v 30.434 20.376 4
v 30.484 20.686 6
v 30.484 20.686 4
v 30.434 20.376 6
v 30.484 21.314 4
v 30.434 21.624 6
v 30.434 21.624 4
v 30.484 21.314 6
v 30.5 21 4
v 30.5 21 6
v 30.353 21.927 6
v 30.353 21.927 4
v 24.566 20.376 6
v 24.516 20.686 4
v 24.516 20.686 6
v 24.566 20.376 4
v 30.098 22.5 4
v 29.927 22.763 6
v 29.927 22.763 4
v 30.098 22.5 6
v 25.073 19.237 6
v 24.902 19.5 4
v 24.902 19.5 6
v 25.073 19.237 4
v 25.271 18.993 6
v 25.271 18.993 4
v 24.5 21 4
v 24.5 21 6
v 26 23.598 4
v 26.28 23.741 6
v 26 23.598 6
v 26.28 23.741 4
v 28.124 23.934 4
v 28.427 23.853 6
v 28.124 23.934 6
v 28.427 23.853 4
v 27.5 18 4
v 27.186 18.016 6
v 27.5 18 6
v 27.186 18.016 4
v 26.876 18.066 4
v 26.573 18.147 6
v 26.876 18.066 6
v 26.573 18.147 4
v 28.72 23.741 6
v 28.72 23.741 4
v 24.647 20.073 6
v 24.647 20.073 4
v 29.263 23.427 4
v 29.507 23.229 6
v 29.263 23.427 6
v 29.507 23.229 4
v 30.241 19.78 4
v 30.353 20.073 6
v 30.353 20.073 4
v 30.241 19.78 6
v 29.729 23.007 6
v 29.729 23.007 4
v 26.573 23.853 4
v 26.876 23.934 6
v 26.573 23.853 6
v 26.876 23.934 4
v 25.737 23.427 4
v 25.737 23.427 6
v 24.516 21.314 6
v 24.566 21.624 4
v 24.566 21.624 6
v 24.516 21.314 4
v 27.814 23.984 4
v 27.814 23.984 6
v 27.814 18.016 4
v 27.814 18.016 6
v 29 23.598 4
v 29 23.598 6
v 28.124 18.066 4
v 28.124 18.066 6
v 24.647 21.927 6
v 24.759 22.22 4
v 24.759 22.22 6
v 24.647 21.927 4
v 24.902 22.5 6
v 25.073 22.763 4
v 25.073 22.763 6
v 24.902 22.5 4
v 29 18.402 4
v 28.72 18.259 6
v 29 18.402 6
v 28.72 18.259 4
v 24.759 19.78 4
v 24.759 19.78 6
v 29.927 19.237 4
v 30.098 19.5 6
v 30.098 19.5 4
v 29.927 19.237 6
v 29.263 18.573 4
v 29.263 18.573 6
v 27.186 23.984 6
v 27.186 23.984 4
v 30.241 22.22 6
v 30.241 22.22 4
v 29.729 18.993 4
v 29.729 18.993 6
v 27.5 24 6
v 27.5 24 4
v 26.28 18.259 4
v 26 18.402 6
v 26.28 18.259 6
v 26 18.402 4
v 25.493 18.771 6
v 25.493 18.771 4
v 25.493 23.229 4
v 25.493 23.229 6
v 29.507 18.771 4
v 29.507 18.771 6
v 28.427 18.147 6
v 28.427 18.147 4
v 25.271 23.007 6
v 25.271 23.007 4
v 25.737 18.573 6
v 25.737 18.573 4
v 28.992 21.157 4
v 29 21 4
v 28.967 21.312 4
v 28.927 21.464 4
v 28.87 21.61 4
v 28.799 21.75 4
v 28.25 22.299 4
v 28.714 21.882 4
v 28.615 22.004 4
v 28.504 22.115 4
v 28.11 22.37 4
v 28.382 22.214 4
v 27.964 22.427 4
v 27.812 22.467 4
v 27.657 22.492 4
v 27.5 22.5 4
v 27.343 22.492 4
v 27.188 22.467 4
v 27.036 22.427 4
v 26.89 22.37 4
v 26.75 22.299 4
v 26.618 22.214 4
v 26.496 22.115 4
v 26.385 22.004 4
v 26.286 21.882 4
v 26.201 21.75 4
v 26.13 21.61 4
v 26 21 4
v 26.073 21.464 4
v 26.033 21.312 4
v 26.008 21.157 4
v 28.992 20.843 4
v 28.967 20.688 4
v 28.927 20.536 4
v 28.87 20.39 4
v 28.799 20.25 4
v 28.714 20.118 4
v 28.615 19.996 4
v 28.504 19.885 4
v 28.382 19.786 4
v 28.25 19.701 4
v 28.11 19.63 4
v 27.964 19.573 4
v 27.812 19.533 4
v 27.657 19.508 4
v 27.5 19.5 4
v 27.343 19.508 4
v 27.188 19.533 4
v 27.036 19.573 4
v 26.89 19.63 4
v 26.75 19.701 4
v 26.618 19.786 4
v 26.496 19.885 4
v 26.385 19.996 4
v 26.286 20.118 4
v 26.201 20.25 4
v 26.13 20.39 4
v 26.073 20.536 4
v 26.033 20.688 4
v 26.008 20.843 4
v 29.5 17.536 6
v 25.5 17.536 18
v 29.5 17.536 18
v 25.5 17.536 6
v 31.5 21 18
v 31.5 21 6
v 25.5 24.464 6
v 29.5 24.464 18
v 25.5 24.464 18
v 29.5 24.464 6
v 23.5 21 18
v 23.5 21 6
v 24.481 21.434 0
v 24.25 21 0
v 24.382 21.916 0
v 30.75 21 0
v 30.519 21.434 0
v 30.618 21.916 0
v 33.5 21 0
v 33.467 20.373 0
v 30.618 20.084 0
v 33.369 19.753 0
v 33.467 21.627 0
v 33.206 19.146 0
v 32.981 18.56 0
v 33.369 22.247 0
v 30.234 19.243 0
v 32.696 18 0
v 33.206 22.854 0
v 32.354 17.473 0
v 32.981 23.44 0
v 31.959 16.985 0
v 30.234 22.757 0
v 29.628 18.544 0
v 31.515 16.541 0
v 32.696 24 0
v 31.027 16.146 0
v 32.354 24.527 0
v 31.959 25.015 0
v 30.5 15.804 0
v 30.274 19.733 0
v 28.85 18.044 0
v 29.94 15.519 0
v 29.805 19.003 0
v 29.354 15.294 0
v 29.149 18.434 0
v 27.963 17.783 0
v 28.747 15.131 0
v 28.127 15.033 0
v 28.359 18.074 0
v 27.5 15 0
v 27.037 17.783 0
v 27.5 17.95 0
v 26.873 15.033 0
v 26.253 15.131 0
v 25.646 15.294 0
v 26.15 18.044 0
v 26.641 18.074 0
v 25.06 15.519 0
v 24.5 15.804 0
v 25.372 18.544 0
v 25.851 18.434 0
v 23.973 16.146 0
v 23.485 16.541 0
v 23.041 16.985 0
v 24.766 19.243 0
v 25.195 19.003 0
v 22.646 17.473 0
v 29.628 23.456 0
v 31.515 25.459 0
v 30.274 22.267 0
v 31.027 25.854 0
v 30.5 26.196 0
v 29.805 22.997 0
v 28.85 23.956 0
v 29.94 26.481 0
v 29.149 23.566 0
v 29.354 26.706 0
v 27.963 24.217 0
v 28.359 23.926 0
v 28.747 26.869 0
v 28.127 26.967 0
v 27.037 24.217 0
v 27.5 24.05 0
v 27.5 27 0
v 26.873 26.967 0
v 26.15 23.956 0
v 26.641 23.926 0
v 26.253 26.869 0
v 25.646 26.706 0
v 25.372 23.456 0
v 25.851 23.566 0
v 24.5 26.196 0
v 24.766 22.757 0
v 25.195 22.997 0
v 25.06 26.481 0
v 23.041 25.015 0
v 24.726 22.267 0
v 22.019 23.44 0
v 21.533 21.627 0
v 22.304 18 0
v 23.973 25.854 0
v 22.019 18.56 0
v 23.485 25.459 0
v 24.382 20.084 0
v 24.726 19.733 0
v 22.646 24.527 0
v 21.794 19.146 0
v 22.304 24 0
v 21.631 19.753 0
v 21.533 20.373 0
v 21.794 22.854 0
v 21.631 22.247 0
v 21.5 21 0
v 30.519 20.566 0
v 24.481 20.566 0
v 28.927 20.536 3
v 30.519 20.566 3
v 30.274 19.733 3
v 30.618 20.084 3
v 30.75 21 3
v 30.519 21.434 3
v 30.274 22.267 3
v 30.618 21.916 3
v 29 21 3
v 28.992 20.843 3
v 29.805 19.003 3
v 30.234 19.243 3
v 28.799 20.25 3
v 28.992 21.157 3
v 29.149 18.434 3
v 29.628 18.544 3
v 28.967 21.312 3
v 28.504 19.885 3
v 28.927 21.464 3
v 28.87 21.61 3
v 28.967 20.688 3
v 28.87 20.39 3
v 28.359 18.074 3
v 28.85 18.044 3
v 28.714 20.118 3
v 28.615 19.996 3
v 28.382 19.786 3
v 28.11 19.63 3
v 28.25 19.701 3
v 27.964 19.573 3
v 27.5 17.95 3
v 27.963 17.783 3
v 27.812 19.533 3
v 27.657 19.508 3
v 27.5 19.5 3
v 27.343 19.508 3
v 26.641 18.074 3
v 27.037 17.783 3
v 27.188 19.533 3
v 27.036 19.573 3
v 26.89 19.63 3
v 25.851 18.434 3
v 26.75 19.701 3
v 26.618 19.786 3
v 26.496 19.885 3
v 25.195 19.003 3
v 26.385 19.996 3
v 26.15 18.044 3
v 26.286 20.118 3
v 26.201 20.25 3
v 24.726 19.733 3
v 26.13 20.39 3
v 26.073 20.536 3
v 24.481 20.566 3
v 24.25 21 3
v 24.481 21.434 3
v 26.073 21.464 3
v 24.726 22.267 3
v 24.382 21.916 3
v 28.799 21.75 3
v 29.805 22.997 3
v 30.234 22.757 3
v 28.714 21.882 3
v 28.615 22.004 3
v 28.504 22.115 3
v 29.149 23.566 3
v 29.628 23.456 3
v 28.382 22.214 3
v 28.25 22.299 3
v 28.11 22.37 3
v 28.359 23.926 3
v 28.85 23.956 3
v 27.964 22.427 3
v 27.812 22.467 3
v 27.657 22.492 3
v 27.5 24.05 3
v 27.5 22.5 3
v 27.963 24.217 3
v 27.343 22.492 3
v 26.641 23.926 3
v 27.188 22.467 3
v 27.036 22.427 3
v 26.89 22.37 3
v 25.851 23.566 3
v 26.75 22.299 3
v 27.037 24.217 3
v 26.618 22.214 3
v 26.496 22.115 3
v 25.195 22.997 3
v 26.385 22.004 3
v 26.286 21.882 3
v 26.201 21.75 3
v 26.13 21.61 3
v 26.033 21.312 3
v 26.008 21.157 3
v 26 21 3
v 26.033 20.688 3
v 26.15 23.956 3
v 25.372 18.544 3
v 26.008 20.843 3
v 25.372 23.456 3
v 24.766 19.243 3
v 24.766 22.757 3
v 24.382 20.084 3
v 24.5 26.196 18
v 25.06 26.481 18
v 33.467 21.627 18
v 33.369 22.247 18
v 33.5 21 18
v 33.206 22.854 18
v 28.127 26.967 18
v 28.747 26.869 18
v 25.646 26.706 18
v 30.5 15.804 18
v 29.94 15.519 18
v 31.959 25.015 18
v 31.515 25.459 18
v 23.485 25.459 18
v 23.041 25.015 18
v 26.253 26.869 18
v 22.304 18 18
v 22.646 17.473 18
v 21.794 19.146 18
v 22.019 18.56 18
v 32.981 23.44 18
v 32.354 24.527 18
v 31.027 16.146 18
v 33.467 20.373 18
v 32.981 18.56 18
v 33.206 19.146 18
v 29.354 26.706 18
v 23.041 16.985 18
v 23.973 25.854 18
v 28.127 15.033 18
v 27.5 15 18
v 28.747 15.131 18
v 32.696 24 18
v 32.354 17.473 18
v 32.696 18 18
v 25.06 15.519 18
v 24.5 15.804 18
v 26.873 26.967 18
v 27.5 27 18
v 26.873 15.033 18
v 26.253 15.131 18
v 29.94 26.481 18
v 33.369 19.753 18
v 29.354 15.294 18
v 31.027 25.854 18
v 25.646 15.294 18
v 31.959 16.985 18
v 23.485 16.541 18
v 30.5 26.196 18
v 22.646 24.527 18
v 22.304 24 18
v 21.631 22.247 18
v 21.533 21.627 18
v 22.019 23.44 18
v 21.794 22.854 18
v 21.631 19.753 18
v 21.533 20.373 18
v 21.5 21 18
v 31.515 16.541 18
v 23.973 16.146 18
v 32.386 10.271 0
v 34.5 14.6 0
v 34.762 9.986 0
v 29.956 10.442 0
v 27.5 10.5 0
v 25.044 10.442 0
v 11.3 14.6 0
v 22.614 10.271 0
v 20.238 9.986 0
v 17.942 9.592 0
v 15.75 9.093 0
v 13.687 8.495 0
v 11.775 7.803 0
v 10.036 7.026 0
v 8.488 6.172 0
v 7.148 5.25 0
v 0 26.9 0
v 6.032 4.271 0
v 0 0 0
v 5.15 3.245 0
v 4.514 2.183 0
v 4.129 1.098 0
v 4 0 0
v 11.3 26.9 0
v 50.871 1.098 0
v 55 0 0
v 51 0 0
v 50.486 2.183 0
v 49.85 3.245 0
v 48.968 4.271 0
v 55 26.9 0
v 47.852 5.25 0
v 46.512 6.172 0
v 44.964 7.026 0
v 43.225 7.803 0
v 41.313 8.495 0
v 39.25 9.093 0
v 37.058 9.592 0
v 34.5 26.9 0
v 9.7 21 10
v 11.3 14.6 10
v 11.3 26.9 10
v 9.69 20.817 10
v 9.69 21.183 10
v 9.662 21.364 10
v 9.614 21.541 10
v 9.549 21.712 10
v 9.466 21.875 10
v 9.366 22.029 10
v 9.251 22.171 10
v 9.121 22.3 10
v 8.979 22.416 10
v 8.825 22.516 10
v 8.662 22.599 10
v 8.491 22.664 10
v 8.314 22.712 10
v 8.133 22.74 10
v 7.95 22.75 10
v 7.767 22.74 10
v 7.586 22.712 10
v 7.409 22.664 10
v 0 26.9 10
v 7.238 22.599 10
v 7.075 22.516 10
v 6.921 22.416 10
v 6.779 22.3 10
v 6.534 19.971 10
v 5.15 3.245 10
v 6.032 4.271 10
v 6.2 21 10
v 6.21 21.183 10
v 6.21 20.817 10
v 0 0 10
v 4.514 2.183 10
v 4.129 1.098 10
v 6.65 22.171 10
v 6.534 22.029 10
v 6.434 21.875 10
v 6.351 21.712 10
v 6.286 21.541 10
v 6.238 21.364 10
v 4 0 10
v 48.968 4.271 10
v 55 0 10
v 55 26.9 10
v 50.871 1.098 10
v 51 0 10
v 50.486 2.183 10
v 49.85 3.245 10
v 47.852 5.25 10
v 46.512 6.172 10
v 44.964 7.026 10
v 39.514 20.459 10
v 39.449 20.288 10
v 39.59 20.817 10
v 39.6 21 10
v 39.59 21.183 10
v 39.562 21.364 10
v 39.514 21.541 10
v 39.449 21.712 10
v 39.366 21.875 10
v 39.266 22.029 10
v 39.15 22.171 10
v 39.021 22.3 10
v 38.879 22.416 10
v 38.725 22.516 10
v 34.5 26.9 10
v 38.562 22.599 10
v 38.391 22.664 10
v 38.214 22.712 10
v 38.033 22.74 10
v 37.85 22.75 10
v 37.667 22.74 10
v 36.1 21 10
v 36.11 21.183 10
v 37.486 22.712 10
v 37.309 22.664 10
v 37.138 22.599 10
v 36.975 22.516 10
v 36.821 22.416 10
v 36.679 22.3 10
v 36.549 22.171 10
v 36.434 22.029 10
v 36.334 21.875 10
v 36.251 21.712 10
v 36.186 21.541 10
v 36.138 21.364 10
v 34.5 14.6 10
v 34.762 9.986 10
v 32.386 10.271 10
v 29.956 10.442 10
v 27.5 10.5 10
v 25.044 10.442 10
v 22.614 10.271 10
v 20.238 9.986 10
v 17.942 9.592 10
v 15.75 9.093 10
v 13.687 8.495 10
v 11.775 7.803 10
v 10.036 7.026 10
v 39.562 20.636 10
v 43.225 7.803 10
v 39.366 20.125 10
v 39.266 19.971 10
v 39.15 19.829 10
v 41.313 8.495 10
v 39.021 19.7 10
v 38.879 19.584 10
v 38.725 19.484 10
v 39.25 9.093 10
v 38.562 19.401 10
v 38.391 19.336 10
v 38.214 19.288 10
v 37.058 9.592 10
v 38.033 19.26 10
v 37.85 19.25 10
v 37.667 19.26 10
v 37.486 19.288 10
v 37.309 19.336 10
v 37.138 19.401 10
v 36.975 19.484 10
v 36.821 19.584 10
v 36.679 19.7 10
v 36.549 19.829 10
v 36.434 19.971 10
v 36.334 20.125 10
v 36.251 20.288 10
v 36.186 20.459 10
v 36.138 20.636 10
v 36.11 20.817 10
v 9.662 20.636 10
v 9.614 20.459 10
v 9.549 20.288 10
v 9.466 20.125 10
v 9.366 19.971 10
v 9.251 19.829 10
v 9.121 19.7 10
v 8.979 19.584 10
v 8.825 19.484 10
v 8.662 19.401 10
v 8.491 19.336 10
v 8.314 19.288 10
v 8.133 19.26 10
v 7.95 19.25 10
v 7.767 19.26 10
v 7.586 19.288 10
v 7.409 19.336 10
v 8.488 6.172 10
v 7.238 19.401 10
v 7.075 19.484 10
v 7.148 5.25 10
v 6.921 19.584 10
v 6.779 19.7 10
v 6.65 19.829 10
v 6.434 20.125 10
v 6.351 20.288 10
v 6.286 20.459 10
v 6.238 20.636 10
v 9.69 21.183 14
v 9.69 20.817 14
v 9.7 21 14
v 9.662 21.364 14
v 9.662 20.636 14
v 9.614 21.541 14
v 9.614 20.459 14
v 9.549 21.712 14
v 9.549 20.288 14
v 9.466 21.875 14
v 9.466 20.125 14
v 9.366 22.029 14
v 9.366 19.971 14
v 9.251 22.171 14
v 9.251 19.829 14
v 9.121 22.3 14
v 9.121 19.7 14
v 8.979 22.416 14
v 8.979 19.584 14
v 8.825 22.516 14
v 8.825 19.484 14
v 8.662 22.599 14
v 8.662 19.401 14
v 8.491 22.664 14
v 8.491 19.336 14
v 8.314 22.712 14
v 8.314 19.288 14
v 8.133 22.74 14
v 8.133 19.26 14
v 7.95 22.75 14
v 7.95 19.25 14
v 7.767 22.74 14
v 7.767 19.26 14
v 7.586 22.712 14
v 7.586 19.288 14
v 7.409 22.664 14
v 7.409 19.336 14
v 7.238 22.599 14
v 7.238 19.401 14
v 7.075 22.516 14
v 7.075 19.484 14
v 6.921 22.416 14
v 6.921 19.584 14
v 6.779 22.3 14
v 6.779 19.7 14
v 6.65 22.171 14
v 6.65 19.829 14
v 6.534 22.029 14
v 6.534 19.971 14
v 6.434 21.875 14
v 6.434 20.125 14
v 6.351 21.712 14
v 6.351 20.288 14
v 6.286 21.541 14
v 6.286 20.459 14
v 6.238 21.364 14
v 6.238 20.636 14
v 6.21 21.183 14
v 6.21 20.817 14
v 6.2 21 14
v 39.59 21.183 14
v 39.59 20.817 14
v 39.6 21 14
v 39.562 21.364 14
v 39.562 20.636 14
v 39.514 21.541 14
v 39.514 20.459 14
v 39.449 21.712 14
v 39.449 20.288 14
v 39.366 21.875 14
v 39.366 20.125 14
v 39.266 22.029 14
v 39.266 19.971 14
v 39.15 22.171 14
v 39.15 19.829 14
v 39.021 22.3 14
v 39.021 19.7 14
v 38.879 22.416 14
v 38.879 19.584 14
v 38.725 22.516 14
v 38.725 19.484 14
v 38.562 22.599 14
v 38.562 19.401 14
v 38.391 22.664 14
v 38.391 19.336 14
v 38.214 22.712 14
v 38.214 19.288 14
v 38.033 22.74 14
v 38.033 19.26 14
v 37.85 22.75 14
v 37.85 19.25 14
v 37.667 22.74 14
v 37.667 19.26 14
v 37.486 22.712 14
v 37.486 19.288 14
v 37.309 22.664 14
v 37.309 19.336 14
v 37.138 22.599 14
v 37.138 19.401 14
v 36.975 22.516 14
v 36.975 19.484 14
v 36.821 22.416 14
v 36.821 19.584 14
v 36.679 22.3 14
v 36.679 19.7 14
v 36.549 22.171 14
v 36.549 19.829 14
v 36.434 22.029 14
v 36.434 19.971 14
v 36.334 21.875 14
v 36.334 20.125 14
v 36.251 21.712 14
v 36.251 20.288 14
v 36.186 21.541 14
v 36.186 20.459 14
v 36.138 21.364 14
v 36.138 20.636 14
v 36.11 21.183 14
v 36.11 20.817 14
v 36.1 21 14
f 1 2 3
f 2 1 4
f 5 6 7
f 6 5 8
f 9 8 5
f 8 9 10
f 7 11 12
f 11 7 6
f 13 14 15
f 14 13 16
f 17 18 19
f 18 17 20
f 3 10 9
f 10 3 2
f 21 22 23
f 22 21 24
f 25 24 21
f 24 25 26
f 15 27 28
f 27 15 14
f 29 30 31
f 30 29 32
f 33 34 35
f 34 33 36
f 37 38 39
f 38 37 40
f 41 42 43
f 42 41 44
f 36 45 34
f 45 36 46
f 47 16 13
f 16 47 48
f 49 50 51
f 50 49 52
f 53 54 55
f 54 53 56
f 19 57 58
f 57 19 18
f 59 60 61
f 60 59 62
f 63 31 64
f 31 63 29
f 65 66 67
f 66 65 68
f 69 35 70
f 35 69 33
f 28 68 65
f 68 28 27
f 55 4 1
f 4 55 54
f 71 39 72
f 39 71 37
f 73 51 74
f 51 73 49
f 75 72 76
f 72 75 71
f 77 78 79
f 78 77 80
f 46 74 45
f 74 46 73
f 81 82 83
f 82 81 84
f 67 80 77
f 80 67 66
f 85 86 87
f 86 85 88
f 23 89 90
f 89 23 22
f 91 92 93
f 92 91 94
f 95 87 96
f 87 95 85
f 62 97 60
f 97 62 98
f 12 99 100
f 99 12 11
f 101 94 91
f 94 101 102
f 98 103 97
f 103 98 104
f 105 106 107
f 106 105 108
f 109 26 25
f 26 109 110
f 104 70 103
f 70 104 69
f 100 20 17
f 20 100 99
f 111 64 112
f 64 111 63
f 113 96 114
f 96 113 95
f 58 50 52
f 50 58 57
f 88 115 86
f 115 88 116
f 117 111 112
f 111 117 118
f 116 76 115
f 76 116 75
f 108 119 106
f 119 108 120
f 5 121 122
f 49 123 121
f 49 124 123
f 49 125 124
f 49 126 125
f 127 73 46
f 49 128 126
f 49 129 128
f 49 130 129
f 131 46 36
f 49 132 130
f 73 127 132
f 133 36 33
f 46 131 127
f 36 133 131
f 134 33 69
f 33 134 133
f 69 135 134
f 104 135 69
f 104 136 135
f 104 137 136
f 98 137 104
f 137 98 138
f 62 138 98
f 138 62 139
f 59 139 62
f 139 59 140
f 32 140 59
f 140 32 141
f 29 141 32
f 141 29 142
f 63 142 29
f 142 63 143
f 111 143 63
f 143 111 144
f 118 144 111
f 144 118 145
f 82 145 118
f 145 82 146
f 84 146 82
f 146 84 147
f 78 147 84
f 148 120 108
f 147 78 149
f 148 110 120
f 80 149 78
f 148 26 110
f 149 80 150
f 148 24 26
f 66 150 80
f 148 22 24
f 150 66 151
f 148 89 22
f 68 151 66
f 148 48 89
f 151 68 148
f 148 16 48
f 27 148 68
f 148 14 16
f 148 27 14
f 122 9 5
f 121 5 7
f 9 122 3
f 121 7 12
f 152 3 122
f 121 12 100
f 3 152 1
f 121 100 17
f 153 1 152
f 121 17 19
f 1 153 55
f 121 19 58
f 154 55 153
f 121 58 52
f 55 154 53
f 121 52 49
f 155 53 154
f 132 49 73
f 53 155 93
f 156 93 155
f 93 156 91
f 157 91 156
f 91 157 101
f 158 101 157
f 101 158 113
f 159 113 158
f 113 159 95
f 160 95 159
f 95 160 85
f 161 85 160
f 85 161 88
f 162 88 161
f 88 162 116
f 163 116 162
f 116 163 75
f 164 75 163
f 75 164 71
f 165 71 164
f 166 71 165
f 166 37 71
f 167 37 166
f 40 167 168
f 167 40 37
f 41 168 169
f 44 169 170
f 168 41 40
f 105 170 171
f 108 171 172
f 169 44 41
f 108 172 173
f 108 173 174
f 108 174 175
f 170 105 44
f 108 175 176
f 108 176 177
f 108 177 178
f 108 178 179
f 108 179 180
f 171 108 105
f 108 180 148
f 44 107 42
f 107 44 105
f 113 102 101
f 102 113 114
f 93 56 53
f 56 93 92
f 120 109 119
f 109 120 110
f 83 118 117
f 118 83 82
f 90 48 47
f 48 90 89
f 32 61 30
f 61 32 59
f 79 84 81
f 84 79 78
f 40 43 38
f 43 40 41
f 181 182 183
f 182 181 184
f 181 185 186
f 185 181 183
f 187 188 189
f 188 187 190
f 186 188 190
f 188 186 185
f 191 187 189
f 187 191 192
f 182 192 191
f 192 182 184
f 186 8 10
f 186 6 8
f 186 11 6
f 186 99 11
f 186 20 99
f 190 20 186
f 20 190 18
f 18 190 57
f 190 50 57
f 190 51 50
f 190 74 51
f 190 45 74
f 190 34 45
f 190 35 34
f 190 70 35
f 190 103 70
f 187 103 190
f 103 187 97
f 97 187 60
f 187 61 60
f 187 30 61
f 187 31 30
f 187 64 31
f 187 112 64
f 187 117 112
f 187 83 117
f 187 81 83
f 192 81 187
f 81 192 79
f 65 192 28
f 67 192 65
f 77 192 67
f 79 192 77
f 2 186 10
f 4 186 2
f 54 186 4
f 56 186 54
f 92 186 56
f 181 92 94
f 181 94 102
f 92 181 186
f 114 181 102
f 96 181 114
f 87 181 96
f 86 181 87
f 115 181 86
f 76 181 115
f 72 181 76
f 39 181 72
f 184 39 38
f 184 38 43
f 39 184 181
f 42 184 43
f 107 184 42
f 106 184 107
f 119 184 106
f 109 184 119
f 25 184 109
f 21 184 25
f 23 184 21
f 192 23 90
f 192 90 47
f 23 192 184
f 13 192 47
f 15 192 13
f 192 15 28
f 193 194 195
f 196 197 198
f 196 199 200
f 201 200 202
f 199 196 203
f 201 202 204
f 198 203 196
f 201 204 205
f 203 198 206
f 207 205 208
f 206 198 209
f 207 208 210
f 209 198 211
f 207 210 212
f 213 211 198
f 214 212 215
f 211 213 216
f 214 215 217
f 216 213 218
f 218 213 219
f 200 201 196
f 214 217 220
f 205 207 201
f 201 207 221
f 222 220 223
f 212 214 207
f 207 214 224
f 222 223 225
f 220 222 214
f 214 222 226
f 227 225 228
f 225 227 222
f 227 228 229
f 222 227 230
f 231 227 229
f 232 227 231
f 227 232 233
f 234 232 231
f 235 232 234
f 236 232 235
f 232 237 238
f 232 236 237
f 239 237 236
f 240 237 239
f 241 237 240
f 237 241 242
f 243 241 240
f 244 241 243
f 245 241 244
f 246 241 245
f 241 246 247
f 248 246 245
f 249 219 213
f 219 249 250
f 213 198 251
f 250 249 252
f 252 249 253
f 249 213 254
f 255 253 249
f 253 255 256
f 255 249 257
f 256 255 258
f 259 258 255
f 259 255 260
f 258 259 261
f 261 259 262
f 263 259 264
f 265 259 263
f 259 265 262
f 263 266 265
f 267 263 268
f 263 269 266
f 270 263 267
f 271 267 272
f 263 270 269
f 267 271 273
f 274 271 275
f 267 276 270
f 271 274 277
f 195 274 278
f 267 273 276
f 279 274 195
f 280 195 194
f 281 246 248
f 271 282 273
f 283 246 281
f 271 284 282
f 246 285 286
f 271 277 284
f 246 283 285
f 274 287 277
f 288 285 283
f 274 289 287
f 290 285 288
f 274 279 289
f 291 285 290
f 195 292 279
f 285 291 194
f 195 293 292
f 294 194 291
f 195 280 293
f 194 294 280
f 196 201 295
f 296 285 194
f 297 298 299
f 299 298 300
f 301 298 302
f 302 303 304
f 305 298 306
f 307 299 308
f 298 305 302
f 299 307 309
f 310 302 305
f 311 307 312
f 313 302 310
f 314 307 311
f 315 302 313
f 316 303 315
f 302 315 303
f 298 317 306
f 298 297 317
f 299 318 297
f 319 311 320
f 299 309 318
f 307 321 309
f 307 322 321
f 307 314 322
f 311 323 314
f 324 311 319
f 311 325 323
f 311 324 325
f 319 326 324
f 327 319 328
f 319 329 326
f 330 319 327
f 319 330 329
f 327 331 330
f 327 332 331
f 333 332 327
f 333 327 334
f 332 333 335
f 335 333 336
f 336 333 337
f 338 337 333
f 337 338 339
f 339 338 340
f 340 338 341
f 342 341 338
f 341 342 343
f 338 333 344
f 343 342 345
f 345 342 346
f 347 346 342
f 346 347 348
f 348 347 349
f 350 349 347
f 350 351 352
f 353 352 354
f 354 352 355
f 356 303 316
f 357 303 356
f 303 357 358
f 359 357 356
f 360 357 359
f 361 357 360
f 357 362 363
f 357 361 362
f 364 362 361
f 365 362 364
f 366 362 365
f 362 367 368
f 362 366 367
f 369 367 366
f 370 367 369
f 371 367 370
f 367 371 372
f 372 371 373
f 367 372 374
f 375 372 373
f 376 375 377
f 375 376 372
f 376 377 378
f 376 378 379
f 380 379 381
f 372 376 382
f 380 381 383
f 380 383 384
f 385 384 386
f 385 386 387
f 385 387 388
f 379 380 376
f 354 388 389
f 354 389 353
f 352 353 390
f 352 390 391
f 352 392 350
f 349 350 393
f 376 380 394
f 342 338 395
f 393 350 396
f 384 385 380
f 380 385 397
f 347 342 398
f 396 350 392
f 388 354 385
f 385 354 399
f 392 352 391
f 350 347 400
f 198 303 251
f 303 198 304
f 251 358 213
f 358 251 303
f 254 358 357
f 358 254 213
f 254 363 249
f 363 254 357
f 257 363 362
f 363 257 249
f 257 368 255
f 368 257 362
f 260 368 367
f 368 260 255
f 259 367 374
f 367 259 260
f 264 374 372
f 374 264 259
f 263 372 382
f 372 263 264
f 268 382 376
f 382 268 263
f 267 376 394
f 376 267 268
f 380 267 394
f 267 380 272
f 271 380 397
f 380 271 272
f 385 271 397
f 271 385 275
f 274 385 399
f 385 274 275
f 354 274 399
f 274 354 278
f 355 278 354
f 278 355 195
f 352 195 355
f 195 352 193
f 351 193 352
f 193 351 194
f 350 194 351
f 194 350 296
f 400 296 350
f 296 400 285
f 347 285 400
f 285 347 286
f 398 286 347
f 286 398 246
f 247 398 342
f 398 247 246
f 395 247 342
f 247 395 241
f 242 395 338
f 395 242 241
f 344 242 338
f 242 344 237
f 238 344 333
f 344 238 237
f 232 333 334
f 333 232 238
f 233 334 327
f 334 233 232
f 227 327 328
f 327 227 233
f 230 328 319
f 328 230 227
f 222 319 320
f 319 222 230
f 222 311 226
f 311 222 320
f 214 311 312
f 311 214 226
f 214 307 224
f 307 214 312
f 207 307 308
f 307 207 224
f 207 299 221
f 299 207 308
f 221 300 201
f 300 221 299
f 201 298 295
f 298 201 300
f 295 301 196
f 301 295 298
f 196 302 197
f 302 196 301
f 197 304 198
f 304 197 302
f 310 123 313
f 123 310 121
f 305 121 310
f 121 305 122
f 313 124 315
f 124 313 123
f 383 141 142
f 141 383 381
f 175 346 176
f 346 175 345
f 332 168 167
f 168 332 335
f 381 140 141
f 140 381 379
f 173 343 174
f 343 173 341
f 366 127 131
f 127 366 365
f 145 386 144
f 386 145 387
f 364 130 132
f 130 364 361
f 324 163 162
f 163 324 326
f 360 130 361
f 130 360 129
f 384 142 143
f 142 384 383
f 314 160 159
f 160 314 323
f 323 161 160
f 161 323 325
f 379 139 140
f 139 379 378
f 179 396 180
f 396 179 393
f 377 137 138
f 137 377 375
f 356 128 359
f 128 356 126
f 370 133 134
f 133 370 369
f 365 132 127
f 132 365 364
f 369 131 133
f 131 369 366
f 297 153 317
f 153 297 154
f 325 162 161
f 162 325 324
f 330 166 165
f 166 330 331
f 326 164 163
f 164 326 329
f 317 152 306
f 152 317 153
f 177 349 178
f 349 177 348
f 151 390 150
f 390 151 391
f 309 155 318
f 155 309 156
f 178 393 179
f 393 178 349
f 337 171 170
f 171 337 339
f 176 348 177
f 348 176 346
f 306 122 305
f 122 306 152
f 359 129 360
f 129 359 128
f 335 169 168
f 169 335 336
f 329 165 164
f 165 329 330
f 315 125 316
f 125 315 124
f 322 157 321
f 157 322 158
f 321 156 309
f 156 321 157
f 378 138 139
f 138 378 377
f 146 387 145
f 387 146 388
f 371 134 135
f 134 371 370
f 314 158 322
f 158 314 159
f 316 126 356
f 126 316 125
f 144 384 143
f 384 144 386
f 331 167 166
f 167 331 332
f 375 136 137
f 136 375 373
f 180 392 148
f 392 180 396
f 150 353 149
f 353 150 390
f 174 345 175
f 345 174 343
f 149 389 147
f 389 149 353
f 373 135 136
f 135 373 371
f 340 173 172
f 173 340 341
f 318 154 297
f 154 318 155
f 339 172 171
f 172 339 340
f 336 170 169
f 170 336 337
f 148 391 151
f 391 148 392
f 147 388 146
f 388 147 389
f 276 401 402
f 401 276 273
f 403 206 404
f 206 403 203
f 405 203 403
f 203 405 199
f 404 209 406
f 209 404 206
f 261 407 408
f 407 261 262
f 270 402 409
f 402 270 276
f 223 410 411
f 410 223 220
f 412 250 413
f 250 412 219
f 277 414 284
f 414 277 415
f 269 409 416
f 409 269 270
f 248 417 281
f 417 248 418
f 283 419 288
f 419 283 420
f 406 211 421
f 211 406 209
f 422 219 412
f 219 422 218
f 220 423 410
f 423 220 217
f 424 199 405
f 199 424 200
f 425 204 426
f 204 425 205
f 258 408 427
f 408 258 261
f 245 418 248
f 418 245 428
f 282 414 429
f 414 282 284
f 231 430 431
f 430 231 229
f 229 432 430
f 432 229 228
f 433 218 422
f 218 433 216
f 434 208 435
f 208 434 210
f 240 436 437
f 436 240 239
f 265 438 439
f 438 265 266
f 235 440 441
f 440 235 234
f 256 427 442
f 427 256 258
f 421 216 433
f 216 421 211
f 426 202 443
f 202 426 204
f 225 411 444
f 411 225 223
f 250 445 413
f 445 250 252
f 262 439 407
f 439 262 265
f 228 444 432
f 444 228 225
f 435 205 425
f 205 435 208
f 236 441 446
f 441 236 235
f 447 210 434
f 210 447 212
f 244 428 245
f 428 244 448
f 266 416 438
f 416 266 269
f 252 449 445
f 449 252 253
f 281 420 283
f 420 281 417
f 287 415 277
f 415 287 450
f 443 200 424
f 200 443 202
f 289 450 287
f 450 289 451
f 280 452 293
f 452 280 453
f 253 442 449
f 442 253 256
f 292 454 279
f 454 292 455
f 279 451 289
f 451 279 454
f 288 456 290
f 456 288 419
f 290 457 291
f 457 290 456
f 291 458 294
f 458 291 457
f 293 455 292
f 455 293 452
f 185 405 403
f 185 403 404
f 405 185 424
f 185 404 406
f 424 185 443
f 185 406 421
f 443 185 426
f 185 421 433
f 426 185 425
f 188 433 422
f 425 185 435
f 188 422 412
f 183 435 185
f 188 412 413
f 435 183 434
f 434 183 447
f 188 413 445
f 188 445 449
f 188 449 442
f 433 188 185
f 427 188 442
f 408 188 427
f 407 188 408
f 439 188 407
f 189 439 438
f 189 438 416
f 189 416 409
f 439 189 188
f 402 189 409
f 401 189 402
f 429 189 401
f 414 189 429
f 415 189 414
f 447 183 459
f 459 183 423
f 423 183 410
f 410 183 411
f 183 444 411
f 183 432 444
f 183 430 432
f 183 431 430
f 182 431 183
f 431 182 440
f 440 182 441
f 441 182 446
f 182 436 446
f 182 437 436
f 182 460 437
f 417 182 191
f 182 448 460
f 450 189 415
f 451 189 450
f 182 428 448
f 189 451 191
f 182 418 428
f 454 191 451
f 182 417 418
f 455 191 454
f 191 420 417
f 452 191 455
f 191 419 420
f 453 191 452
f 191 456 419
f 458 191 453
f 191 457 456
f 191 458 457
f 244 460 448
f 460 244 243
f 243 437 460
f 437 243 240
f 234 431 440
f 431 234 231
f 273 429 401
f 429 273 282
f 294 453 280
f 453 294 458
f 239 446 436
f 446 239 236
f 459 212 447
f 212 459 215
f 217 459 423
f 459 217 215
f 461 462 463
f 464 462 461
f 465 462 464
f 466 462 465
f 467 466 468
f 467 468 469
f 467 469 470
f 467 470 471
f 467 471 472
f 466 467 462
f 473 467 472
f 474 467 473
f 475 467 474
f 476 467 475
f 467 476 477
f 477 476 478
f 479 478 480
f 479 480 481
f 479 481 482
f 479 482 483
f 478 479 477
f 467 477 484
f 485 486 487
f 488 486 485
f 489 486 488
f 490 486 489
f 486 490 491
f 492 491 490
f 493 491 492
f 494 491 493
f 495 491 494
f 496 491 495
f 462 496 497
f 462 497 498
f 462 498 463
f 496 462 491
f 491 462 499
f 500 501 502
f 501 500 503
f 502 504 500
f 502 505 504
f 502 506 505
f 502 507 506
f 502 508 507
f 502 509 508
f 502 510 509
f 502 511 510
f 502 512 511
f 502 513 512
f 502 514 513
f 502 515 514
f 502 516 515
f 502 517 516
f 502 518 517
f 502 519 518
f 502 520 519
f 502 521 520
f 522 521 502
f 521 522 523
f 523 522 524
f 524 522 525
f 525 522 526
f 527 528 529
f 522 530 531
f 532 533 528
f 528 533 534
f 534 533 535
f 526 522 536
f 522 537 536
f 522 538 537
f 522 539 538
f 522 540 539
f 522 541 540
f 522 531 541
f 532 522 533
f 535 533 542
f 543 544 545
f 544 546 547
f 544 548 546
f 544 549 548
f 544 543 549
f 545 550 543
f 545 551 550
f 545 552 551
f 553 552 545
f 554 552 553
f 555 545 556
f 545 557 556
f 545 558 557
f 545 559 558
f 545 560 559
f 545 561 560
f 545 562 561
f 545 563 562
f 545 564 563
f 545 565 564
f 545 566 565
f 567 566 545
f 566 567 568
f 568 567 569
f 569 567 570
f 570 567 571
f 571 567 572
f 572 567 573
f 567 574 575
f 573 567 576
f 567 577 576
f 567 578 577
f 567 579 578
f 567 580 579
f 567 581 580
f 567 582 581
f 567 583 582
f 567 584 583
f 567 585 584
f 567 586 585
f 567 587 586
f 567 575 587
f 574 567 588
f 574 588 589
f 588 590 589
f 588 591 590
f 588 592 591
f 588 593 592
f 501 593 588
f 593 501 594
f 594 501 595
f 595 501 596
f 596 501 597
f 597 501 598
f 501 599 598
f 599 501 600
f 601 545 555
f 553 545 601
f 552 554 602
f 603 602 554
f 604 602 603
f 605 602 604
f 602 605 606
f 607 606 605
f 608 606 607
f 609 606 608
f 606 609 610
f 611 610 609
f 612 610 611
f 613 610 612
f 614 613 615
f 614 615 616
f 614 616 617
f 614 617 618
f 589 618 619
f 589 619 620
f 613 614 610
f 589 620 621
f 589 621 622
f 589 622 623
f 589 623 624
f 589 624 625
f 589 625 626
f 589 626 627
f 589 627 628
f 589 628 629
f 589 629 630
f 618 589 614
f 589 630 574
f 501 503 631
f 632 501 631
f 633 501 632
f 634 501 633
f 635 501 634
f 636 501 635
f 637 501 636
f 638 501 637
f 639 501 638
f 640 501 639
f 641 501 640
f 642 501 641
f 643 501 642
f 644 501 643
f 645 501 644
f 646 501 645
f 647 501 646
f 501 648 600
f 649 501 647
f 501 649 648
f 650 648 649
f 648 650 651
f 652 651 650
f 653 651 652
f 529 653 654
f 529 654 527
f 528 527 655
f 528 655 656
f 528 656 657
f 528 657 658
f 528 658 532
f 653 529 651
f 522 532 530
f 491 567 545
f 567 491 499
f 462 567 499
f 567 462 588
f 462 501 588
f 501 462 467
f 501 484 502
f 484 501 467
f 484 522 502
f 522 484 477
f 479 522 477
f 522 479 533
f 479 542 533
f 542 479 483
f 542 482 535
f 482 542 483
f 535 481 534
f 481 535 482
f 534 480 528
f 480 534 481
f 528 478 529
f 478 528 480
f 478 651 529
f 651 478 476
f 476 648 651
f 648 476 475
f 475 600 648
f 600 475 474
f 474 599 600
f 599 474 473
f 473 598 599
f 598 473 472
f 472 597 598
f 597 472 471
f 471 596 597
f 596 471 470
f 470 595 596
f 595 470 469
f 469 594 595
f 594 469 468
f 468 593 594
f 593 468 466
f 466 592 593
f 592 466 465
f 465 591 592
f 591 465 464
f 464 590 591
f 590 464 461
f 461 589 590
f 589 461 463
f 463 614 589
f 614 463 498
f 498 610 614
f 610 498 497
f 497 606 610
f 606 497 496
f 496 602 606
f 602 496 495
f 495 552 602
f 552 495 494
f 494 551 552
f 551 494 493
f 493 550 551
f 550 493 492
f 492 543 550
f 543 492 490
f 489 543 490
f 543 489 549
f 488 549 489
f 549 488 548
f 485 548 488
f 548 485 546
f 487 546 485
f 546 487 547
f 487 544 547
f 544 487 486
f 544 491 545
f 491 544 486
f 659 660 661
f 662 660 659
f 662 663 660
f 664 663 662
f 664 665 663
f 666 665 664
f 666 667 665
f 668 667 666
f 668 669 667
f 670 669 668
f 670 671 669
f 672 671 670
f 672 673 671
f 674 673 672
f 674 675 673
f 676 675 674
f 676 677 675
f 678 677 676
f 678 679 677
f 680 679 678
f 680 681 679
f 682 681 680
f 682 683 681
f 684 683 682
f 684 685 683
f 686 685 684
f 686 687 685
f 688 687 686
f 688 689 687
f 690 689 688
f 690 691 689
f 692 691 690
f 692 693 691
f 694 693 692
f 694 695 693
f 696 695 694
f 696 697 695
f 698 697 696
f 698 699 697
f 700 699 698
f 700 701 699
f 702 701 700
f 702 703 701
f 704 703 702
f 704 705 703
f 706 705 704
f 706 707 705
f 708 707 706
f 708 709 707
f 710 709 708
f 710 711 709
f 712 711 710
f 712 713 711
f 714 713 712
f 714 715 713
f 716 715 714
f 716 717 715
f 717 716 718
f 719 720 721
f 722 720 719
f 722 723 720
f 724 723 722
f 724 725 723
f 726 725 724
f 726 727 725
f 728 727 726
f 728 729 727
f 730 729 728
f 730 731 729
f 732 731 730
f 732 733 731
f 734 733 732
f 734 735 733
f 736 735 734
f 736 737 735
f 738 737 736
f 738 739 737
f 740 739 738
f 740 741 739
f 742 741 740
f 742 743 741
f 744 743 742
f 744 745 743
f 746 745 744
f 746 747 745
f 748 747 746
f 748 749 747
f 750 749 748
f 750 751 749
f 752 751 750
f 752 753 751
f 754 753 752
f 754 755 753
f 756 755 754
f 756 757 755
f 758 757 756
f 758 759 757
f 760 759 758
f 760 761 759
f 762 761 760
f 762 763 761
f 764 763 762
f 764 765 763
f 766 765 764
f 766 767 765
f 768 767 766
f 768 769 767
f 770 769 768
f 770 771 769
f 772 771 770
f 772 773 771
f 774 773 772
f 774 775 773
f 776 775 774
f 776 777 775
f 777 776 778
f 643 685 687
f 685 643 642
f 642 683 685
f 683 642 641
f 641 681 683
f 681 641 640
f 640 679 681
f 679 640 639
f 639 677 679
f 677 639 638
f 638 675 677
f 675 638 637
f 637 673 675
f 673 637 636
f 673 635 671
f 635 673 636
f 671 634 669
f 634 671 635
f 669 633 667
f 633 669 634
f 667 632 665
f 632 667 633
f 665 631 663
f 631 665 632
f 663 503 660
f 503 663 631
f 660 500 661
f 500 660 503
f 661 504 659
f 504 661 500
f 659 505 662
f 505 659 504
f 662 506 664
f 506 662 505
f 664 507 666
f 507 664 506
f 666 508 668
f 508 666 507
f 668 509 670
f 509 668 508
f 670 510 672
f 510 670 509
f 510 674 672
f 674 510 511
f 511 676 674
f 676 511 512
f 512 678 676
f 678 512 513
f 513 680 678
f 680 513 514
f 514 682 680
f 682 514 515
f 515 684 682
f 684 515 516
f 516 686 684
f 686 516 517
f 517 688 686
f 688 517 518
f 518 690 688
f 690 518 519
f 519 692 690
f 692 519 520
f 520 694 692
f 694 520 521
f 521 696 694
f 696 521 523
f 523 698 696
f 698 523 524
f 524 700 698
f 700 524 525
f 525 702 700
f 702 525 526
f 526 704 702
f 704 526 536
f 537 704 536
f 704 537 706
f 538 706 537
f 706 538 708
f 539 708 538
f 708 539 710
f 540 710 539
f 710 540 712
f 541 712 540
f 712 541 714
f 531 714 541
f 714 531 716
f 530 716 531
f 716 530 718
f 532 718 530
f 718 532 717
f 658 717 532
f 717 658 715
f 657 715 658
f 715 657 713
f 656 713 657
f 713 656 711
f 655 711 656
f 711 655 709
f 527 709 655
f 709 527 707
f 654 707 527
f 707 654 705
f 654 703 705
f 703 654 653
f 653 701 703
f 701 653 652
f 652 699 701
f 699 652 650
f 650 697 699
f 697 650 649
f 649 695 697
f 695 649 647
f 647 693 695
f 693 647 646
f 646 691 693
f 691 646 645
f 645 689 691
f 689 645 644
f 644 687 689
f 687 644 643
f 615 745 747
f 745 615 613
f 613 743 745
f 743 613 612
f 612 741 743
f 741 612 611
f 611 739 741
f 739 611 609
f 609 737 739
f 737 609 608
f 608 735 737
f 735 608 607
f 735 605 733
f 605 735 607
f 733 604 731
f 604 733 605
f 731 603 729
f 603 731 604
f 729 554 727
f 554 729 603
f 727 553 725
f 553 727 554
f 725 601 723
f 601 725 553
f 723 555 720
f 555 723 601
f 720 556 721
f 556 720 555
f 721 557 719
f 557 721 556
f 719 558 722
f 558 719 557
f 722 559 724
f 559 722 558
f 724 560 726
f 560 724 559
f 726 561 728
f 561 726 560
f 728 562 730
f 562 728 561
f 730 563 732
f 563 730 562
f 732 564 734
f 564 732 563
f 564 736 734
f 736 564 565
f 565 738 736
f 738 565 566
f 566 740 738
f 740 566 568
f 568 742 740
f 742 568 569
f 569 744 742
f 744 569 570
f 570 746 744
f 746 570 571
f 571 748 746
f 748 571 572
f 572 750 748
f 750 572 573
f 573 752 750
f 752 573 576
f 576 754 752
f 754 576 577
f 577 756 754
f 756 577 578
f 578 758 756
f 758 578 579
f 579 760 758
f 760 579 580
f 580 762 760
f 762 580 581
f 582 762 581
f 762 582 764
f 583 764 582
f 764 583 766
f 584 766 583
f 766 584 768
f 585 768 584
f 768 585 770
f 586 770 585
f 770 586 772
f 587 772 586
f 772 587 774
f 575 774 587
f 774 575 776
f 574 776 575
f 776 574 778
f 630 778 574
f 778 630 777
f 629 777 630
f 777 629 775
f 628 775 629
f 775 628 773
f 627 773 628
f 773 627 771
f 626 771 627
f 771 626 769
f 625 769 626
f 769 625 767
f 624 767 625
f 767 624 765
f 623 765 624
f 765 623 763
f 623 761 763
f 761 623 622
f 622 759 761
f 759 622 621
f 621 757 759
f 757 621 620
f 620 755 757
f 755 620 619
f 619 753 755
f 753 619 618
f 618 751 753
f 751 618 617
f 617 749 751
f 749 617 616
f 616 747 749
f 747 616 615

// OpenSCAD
servoHeight = 11.8;
servoWidth = 23.2;
pegGap = 1.6;
pegDiameter = 3.5;
pegHeight = 4;

largeSpokeOffset = 16.2;
//
//   largeSpokeOffset
//          |
//          v
// |    .[----o--].       |  ]- servoHeight \
// |    ^     ^   ^       |                 |- heightToRod
// |    |     |   |       |                 |
// |   peg    |  peg      |                 /
//          center
//
//  <---- blindWidth ---->


// 45.5
blindWidth = 55;
heightToRod = 21;

partThickness = 10;

servoPosX = (blindWidth / 2) - largeSpokeOffset;

linear_extrude(partThickness) {
    difference() {
        square([blindWidth, heightToRod + servoHeight / 2]);

        translate([servoPosX, heightToRod - servoHeight / 2 - .5]) {
            square([servoWidth, servoHeight + .5]);
        }
        translate([blindWidth / 2, 0]) {
            resize([blindWidth - 8, heightToRod]) {
                circle($fn=60);
            }
        }
    }
}

linear_extrude(partThickness + pegHeight) {
    translate([servoPosX, 0]) {
        translate([0, heightToRod]) {
            translate([-pegDiameter/2 - pegGap, 0]) {
                circle(d=pegDiameter, $fn=60);
            }
            translate([servoWidth + pegDiameter/2 + pegGap, 0]) {
                circle(d=pegDiameter, $fn=60);
            }
        }
    }
}


gearDiameter = 6.5;
gearDepth = 3;
splineCount = 22;
hexDiameter = 8; // (enclosing circle)
screwDiameter = 3;
screwHeadDiameter = 6;

translate([/*servoPosX + servoWidth / 2*/blindWidth / 2, heightToRod]) {
    difference() {
        cylinder(h=gearDepth + 1 + 14, d=hexDiameter + 4, $fn=60);

        union() {
            linear_extrude(gearDepth) {
                Star(splineCount, gearDiameter / 2, (gearDiameter-.4) / 2);
            }

            cylinder(h=40, d=screwDiameter, $fn=60);
            translate([0, 0, gearDepth + 1]) {
                cylinder(h=3, d=screwHeadDiameter, $fn=60);

                translate([0, 0, 2]) {
                    cylinder(h=20, d=hexDiameter, $fn=6);
                }
            }
        }
    }
}


// points = number of points (minimum 3)
// outer  = radius to outer points
// inner  = radius to inner points
module Star(points, outer, inner) {

    // polar to cartesian: radius/angle to x/y
    function x(r, a) = r * cos(a);
    function y(r, a) = r * sin(a);

    // angular width of each pie slice of the star
    increment = 360/points;

    union() {
        for (p = [0 : points-1]) {
            // outer is outer point p
            // inner is inner point following p
            // next is next outer point following p
            x_outer = x(outer, increment * p);
            y_outer = y(outer, increment * p);
            x_inner = x(inner, (increment * p) + (increment/2));
            y_inner = y(inner, (increment * p) + (increment/2));
            x_next  = x(outer, increment * (p+1));
            y_next  = y(outer, increment * (p+1));
            polygon(
                points=[
                    [x_outer, y_outer],
                    [x_inner, y_inner],
                    [x_next, y_next],
                    [0, 0]
                ],
                paths  = [[0, 1, 2, 3]]
            );
        }
    }
}
